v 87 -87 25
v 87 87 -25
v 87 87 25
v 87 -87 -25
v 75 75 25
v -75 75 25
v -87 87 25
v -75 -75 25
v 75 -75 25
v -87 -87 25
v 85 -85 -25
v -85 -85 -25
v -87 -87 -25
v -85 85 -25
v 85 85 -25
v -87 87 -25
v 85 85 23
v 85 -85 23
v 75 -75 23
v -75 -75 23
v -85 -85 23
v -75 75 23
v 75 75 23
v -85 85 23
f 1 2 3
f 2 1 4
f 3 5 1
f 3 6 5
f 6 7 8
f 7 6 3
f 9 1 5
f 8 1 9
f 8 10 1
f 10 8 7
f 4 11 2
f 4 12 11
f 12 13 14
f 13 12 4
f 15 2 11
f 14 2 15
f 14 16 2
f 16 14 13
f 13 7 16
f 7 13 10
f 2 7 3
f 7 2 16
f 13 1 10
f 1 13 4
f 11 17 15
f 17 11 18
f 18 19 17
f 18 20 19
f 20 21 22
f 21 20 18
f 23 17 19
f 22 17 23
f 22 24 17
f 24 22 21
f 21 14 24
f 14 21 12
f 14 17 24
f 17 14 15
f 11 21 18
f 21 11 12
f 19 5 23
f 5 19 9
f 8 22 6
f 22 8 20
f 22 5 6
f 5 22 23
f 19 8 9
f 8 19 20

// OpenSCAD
epaisseur = 2;
longueur_panneau_led = 150;
largeur_panneau_led = 150;
marge = 10;
longueur_boite = longueur_panneau_led+2*marge;
largeur_boite = largeur_panneau_led+2*marge;
hauteur_boite = 50;

module bouton_pwm(){
    
}

module support_circuit_pwm(){
    
}

module boite() {
    difference(){
        cube([longueur_boite+2*epaisseur, largeur_boite+2*epaisseur, hauteur_boite], center=true);
        translate([0, 0, epaisseur])
        cube([longueur_boite, largeur_boite, hauteur_boite], center=true);
    }
}

module couvercle(){
    difference(){
        cube([longueur_boite+2*epaisseur, largeur_boite+2*epaisseur, hauteur_boite], center=true);
        translate([0, 0, -epaisseur])
        cube([longueur_boite, largeur_boite, hauteur_boite], center=true);
        translate([0, 0, hauteur_boite/2])
        cube([longueur_panneau_led, largeur_panneau_led, 10], center=true);
    }
}

//boite();
couvercle();
